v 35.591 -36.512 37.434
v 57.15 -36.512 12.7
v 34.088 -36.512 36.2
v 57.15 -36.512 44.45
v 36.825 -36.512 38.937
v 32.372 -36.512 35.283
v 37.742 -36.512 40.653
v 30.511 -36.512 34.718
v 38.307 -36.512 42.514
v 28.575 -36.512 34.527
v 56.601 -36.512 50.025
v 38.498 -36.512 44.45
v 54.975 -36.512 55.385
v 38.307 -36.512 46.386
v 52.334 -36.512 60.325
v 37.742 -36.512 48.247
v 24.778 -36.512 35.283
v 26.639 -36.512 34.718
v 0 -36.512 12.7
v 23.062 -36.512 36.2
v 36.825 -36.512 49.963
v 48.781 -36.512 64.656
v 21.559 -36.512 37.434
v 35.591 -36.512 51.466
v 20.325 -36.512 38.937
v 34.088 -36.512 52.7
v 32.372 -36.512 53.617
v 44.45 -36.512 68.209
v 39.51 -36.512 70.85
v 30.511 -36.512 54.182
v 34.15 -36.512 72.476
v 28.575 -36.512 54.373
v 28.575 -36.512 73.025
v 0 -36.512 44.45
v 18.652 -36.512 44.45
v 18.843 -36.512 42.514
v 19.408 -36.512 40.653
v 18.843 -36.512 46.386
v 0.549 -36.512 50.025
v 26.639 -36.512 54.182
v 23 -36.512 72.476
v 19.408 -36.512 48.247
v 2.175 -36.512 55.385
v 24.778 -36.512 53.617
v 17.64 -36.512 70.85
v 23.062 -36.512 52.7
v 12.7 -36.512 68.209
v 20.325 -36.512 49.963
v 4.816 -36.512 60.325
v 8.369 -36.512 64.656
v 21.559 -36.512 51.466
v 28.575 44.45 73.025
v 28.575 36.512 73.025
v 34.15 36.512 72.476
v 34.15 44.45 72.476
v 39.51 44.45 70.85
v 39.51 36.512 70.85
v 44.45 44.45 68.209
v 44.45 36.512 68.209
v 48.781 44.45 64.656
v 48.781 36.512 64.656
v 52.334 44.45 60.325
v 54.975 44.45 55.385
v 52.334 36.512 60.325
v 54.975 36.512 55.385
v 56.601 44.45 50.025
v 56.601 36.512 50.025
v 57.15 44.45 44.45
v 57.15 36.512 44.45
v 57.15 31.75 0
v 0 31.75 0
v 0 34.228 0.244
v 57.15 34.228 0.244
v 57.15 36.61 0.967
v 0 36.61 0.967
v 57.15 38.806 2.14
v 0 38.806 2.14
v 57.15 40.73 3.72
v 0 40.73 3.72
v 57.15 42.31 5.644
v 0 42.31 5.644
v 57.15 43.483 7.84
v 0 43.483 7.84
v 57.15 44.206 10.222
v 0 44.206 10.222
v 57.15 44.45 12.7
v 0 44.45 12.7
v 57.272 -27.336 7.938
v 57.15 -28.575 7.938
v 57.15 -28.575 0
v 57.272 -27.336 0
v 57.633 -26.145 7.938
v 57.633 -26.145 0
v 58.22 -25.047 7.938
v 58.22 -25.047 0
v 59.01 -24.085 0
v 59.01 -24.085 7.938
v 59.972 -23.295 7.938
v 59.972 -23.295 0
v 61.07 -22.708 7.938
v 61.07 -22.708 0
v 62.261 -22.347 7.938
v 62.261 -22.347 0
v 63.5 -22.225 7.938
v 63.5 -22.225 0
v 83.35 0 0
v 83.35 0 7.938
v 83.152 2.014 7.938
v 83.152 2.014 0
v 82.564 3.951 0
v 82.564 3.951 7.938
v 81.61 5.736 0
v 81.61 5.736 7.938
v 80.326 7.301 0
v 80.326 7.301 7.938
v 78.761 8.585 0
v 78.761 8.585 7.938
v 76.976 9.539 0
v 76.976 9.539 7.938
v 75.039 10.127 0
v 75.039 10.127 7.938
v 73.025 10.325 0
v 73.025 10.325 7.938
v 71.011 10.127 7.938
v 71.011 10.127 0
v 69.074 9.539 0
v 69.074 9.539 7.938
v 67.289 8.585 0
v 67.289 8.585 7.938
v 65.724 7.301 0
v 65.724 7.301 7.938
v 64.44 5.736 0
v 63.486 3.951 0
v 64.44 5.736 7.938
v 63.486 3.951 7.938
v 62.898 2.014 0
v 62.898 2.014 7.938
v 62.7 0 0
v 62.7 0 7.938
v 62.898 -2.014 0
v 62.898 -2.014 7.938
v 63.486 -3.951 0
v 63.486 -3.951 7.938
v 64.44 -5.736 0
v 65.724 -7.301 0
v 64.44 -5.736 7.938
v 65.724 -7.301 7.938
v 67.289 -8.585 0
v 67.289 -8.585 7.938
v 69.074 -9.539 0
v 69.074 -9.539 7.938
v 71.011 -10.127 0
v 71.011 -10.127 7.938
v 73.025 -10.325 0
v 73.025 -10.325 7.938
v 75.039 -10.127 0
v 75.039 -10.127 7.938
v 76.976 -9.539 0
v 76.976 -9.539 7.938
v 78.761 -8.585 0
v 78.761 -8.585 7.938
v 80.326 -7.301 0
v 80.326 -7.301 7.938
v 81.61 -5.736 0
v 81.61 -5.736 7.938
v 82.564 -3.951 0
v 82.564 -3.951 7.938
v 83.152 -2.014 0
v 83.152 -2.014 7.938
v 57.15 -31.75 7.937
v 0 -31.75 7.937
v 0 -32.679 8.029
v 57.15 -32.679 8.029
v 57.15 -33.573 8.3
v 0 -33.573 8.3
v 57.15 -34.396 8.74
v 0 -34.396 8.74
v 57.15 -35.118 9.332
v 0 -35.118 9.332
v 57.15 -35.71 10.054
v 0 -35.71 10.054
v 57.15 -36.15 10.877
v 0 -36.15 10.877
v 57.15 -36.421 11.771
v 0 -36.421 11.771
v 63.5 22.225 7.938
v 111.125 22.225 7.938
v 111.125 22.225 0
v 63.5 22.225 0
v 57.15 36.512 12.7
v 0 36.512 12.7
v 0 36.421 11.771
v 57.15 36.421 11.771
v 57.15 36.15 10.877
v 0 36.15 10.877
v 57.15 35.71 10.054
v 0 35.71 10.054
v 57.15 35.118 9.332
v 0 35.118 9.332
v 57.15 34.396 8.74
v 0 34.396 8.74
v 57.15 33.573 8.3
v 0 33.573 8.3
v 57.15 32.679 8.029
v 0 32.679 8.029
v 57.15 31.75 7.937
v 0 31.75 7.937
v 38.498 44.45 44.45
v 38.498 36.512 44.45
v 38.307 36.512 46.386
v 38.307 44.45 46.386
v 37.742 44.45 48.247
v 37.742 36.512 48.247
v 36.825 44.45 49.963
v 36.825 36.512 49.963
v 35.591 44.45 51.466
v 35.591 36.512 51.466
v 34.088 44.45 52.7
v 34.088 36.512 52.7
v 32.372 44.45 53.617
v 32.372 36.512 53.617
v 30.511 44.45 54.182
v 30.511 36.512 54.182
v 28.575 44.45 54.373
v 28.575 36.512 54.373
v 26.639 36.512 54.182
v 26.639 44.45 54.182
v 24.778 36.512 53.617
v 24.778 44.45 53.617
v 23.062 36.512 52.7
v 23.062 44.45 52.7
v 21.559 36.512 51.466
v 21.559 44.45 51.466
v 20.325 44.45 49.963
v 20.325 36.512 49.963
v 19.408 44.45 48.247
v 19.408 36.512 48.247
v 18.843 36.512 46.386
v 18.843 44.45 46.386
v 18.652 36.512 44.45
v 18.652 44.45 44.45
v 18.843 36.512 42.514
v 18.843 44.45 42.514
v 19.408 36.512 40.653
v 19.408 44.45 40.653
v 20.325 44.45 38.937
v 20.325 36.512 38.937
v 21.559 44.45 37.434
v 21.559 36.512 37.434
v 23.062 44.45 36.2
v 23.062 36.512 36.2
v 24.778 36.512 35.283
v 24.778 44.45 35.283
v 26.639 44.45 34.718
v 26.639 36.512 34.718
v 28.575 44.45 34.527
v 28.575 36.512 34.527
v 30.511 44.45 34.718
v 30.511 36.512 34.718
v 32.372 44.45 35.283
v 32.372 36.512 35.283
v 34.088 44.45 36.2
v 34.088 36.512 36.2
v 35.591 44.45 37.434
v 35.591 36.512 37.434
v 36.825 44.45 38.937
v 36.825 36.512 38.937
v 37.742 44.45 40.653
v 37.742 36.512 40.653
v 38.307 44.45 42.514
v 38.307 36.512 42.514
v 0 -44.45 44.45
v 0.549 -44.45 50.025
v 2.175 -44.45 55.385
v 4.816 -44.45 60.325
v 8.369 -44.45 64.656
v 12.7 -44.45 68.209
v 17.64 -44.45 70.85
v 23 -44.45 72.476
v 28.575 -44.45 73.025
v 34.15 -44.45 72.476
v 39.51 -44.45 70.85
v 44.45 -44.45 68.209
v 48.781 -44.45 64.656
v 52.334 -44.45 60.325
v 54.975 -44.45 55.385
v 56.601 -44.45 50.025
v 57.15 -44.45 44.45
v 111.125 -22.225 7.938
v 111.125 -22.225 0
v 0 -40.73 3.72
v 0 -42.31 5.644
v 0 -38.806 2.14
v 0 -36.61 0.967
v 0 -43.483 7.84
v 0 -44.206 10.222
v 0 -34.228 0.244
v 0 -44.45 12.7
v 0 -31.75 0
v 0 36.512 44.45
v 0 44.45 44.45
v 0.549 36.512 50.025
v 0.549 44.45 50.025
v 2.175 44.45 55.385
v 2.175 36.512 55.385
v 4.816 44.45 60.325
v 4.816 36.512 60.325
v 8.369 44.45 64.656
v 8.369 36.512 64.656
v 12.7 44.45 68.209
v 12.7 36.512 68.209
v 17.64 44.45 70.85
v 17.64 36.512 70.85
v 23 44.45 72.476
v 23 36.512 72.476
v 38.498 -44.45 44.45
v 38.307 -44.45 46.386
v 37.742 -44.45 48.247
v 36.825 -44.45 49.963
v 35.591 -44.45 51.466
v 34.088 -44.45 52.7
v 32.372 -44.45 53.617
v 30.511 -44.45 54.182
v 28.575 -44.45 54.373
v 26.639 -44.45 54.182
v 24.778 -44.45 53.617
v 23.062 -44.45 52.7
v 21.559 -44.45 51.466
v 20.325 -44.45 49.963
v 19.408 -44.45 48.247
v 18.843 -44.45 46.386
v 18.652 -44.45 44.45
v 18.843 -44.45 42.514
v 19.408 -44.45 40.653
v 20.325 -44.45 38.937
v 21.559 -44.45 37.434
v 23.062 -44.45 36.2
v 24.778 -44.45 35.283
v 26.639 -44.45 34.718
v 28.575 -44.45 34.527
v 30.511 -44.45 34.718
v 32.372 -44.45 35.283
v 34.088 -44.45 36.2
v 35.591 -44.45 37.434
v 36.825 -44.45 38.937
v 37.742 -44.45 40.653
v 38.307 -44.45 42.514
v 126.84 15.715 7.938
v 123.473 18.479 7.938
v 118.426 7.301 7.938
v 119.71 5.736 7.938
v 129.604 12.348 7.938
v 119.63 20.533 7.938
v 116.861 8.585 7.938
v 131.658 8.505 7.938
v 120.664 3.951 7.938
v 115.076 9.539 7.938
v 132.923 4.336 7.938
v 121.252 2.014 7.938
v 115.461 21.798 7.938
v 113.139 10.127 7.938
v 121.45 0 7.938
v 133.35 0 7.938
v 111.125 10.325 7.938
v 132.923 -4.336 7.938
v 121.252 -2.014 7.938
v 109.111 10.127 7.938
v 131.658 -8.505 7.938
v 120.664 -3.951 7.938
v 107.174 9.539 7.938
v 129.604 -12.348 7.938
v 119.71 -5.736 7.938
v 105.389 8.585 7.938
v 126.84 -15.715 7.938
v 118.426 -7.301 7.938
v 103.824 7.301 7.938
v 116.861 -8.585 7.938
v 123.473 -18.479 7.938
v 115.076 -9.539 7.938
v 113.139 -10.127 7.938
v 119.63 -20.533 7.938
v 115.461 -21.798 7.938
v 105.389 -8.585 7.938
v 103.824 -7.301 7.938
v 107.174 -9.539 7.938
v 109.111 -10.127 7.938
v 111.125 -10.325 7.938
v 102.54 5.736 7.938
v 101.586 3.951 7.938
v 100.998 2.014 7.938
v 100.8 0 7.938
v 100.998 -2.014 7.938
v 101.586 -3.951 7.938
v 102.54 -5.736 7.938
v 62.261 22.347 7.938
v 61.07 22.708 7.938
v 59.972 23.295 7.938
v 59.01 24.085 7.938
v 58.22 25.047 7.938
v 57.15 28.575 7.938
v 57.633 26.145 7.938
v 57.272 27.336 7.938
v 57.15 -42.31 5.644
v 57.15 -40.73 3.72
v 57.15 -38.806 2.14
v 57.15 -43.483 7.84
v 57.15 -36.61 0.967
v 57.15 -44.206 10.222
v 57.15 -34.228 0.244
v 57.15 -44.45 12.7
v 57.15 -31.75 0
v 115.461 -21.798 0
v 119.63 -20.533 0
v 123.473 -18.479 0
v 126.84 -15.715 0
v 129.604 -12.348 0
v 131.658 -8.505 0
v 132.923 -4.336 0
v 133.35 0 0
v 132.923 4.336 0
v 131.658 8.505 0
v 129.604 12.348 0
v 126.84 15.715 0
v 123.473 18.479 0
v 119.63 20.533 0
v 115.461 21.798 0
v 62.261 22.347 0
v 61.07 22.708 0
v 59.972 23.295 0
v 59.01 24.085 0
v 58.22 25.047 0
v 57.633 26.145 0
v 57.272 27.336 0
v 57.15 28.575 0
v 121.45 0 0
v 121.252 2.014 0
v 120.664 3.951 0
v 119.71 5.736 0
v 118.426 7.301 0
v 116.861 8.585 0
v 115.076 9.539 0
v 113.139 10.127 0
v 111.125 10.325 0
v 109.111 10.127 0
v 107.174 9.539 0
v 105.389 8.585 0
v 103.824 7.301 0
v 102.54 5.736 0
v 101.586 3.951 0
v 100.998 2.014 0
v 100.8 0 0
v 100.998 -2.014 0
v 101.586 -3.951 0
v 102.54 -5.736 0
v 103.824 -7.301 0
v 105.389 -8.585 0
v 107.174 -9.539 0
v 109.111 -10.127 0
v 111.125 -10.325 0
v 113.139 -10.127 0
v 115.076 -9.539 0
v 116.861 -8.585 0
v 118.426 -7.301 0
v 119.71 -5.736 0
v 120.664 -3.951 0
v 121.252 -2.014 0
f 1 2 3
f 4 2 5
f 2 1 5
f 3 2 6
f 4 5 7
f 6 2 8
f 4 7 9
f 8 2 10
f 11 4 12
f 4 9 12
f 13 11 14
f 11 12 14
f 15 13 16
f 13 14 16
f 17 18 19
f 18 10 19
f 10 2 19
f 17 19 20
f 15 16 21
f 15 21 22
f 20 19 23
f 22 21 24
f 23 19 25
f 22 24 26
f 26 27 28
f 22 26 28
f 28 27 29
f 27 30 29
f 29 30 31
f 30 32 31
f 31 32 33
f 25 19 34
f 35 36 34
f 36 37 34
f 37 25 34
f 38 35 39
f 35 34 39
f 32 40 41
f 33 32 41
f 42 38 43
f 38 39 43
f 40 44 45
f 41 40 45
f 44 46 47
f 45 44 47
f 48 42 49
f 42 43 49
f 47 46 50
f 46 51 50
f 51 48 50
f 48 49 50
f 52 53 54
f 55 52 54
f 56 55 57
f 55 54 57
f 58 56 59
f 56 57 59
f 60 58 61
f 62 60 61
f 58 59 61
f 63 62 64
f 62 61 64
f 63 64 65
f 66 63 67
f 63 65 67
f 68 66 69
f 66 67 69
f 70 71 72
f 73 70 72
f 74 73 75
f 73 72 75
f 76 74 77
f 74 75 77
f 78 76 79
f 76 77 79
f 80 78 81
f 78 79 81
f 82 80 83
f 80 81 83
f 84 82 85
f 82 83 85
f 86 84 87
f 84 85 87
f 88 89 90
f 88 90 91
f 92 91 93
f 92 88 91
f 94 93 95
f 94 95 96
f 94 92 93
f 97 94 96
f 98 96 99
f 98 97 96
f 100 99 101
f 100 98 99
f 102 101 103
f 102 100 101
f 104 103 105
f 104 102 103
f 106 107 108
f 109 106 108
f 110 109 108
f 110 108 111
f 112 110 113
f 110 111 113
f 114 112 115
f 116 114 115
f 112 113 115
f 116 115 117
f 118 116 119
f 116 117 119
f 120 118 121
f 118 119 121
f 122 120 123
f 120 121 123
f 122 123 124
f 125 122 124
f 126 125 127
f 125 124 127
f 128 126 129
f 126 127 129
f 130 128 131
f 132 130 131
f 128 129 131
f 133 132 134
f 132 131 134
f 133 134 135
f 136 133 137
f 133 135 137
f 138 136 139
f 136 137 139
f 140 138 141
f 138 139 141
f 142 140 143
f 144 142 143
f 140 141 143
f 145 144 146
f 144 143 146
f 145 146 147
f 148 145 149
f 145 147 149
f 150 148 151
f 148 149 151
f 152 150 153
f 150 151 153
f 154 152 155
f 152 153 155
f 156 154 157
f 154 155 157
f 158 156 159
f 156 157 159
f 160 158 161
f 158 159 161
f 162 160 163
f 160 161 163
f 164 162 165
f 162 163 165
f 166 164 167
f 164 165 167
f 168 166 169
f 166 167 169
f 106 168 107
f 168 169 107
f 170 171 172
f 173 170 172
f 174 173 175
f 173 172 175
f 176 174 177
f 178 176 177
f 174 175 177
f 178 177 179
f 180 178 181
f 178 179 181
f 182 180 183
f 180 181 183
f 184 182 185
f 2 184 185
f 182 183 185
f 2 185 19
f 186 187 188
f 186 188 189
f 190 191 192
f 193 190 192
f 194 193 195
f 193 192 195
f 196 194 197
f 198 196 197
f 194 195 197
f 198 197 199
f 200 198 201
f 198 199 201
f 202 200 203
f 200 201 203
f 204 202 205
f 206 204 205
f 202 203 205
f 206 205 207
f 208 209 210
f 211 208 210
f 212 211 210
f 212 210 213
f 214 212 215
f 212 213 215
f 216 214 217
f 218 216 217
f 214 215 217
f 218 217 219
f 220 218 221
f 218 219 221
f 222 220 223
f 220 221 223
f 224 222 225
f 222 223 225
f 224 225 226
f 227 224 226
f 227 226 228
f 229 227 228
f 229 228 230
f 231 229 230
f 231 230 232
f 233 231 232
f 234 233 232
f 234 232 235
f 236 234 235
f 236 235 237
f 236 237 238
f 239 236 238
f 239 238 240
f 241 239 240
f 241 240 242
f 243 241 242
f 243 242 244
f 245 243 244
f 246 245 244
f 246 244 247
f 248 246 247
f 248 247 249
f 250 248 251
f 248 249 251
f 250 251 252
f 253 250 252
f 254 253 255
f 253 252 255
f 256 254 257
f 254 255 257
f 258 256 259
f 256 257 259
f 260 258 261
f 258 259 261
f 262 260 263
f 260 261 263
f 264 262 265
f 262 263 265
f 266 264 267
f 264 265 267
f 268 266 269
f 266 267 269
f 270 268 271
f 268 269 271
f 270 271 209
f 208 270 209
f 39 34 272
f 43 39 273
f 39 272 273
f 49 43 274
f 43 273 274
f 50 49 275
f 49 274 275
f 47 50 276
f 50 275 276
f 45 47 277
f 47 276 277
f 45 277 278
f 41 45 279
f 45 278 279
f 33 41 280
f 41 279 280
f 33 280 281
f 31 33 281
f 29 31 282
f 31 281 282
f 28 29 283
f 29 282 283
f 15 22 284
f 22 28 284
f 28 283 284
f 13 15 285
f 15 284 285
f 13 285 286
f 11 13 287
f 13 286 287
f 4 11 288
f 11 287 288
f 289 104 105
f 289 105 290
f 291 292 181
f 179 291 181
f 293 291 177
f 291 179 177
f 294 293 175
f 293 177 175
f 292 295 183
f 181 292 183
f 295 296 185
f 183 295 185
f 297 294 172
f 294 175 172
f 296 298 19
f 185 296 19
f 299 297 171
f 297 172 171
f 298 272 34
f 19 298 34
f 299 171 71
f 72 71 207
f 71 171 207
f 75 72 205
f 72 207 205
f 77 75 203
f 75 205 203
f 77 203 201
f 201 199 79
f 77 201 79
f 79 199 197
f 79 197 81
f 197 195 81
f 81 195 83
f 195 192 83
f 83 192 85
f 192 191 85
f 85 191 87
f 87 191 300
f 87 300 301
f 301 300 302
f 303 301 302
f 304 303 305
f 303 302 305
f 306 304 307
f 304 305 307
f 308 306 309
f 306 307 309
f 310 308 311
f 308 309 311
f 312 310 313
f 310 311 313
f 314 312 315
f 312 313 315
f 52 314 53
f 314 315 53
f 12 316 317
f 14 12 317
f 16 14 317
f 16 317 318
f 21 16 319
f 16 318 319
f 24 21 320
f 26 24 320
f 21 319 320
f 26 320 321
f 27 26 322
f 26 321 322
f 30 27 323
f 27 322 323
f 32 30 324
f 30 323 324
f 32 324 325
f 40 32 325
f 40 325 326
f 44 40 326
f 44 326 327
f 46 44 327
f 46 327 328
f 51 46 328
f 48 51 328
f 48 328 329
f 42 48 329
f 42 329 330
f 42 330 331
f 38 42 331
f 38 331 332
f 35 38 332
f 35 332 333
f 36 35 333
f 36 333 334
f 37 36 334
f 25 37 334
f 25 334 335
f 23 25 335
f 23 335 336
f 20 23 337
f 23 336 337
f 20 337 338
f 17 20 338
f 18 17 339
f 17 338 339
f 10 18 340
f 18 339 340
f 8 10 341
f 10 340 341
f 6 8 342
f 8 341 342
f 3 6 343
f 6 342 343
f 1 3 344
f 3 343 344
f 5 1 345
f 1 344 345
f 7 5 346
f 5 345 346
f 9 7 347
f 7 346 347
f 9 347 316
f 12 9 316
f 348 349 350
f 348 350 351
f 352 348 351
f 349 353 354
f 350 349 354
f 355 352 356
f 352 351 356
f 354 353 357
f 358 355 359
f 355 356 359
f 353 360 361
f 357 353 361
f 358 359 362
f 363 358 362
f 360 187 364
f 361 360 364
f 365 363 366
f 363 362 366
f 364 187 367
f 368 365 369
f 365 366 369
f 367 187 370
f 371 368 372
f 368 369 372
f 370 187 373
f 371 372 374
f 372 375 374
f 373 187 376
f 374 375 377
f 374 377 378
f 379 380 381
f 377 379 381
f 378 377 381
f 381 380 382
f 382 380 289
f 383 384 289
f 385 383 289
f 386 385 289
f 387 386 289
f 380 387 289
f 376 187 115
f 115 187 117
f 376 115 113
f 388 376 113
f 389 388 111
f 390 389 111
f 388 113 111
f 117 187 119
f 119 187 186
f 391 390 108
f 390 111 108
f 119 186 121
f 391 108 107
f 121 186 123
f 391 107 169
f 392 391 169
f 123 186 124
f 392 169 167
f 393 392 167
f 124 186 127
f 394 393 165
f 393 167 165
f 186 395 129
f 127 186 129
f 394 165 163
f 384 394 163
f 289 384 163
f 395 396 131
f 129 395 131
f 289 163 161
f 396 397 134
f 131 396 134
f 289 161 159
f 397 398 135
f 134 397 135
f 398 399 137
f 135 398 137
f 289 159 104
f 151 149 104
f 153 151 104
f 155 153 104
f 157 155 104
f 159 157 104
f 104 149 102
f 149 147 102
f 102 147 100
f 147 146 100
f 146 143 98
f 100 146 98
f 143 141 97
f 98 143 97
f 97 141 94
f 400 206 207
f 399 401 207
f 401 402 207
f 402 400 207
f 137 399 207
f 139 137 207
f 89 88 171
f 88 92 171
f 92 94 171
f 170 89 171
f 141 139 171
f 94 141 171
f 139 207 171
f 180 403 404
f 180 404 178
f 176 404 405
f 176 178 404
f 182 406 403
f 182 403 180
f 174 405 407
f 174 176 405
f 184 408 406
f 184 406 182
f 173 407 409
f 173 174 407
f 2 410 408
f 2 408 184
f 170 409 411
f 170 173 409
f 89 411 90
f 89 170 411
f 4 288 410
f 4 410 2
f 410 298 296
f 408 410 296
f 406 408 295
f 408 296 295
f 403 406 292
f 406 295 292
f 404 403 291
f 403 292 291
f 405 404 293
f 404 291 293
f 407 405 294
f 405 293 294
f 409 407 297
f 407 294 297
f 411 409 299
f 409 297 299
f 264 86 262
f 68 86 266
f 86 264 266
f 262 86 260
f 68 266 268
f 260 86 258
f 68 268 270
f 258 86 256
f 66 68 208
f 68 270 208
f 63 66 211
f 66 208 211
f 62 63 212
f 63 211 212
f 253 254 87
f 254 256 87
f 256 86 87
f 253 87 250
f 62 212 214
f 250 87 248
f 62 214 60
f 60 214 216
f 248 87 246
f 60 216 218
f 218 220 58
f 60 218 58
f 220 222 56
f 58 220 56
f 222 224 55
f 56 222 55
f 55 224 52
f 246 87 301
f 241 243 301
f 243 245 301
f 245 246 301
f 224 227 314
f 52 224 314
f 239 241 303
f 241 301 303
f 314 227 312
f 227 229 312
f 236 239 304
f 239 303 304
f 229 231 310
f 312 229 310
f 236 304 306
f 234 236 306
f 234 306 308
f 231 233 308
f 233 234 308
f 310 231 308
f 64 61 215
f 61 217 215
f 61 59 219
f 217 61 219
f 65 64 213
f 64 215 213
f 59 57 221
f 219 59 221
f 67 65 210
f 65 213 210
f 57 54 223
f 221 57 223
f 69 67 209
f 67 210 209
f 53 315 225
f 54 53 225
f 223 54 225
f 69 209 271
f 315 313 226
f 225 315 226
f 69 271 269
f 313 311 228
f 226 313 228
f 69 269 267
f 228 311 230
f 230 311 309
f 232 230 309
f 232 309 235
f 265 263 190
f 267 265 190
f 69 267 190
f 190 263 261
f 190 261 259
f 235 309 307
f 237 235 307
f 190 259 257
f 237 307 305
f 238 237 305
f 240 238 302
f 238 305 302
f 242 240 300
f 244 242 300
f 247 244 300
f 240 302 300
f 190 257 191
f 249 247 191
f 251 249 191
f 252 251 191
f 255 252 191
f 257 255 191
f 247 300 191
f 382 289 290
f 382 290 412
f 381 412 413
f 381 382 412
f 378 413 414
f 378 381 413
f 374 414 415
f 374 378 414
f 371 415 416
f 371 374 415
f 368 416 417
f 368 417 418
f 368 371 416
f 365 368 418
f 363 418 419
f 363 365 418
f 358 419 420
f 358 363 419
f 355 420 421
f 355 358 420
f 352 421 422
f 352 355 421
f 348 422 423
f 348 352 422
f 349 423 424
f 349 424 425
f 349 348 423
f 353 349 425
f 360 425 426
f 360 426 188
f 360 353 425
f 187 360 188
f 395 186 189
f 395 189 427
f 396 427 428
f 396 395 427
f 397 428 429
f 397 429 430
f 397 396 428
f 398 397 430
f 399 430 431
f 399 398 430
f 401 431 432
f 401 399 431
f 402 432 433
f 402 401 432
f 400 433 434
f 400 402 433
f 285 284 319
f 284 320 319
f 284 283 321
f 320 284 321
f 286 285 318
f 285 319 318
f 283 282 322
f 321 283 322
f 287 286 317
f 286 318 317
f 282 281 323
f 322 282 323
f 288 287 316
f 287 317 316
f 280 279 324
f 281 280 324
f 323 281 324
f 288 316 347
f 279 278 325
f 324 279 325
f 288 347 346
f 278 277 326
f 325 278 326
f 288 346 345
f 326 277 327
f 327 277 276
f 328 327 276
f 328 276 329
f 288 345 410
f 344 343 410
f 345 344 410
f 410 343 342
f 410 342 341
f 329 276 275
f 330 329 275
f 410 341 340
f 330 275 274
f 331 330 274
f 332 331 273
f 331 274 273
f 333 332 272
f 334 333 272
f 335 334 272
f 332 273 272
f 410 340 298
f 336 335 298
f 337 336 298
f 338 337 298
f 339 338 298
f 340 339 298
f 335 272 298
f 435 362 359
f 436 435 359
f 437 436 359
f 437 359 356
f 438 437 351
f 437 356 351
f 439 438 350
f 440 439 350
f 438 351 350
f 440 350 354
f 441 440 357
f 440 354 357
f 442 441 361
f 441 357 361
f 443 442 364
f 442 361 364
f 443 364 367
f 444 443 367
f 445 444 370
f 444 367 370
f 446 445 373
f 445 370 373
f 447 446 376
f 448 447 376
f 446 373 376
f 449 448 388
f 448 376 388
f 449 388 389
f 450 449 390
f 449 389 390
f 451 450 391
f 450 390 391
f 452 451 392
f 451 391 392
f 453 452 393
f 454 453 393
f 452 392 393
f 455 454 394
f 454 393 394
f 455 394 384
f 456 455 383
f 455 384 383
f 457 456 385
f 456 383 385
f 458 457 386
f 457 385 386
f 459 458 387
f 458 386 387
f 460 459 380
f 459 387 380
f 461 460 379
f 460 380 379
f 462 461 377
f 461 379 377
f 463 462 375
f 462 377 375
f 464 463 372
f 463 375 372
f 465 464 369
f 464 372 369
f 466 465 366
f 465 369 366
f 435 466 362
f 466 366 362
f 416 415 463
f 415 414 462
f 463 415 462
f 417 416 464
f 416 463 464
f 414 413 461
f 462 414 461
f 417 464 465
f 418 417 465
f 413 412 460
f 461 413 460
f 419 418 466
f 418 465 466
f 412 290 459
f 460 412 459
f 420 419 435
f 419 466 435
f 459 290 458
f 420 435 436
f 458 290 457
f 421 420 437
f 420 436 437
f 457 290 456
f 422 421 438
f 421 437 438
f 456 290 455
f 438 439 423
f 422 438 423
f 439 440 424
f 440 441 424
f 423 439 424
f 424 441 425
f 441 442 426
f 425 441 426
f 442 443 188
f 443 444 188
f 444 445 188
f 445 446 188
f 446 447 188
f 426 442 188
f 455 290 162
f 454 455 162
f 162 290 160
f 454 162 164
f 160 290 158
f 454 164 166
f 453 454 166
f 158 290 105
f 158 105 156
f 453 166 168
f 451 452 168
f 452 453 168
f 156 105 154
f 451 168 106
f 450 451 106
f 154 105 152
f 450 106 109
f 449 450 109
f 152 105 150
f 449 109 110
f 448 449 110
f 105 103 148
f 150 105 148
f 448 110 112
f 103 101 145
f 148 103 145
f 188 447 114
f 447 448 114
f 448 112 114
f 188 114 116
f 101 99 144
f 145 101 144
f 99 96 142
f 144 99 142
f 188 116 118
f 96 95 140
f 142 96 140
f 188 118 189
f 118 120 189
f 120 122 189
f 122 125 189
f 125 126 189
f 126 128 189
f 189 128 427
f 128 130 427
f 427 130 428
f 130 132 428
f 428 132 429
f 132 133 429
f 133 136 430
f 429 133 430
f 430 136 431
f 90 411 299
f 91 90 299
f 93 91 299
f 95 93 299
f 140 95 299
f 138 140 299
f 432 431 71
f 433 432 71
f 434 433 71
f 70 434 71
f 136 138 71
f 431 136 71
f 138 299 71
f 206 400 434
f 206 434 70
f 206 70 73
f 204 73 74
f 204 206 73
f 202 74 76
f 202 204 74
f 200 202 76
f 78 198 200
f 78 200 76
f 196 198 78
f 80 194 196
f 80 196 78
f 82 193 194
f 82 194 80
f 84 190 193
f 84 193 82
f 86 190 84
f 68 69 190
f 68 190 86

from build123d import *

# Parameters (mm, degrees)
F1_DEPTH = 57.15
F2_R     = 10.3251
F3_DEPTH = 7.9375
F4_R     = 9.92251
F5_DEPTH = 88.9


with BuildPart() as f1:
    # F0 (on Right) → F1 (new body)
    with BuildSketch(Plane.YZ):
        with BuildLine():
            Line((-31.75, 0), (0, 0))
            Line((0, 0), (31.75, 0))
            ThreePointArc((31.75, 0), (40.730256, 3.719744), (44.45, 12.7))
            Line((44.45, 12.7), (44.45, 73.025))
            Line((44.45, 73.025), (36.5125, 73.025))
            Line((36.5125, 73.025), (36.5125, 12.7))
            ThreePointArc((36.5125, 12.7), (35.117596, 9.332404), (31.75, 7.9375))
            Line((31.75, 7.9375), (-31.75, 7.9375))
            ThreePointArc((-31.75, 7.9375), (-35.117596, 9.332404), (-36.5125, 12.7))
            Line((-36.5125, 12.7), (-36.5125, 73.025))
            Line((-36.5125, 73.025), (-44.45, 73.025))
            Line((-44.45, 73.025), (-44.45, 12.7))
            ThreePointArc((-44.45, 12.7), (-40.730256, 3.719744), (-31.75, 0))
        make_face()
    extrude(amount=F1_DEPTH)

    # F2 (on face) → F3 (join)
    with BuildSketch(Plane.XY.offset(7.9375)):
        with BuildLine():
            ThreePointArc((63.5, 22.225), (59.009872, 24.084872), (57.15, 28.575))
            Line((57.15, 28.575), (57.15, -28.575))
            ThreePointArc((57.15, -28.575), (59.009872, -24.084872), (63.5, -22.225))
            Line((63.5, -22.225), (111.125, -22.225))
            ThreePointArc((111.125, -22.225), (133.35, 0), (111.125, 22.225))
            Line((111.125, 22.225), (63.5, 22.225))
        make_face()
        with Locations((73.025, 0)):
            Circle(F2_R, mode=Mode.SUBTRACT)
        with Locations((111.125, 0)):
            Circle(F2_R, mode=Mode.SUBTRACT)
    extrude(amount=-F3_DEPTH)

    # F4 (on face) → F5 (cut)
    with BuildSketch(Plane.XZ.offset(44.45)):
        with Locations((28.575, 44.45)):
            Circle(F4_R)
        with BuildLine():
            Line((28.575, 73.025), (0, 73.025))
            Line((0, 73.025), (0, 44.45))
            ThreePointArc((0, 44.45), (8.369424, 64.655576), (28.575, 73.025))
        make_face()
        with BuildLine():
            Line((57.15, 73.025), (28.575, 73.025))
            ThreePointArc((28.575, 73.025), (48.780576, 64.655576), (57.15, 44.45))
            Line((57.15, 44.45), (57.15, 73.025))
        make_face()
    extrude(amount=-F5_DEPTH, mode=Mode.SUBTRACT)


solid = f1.part
